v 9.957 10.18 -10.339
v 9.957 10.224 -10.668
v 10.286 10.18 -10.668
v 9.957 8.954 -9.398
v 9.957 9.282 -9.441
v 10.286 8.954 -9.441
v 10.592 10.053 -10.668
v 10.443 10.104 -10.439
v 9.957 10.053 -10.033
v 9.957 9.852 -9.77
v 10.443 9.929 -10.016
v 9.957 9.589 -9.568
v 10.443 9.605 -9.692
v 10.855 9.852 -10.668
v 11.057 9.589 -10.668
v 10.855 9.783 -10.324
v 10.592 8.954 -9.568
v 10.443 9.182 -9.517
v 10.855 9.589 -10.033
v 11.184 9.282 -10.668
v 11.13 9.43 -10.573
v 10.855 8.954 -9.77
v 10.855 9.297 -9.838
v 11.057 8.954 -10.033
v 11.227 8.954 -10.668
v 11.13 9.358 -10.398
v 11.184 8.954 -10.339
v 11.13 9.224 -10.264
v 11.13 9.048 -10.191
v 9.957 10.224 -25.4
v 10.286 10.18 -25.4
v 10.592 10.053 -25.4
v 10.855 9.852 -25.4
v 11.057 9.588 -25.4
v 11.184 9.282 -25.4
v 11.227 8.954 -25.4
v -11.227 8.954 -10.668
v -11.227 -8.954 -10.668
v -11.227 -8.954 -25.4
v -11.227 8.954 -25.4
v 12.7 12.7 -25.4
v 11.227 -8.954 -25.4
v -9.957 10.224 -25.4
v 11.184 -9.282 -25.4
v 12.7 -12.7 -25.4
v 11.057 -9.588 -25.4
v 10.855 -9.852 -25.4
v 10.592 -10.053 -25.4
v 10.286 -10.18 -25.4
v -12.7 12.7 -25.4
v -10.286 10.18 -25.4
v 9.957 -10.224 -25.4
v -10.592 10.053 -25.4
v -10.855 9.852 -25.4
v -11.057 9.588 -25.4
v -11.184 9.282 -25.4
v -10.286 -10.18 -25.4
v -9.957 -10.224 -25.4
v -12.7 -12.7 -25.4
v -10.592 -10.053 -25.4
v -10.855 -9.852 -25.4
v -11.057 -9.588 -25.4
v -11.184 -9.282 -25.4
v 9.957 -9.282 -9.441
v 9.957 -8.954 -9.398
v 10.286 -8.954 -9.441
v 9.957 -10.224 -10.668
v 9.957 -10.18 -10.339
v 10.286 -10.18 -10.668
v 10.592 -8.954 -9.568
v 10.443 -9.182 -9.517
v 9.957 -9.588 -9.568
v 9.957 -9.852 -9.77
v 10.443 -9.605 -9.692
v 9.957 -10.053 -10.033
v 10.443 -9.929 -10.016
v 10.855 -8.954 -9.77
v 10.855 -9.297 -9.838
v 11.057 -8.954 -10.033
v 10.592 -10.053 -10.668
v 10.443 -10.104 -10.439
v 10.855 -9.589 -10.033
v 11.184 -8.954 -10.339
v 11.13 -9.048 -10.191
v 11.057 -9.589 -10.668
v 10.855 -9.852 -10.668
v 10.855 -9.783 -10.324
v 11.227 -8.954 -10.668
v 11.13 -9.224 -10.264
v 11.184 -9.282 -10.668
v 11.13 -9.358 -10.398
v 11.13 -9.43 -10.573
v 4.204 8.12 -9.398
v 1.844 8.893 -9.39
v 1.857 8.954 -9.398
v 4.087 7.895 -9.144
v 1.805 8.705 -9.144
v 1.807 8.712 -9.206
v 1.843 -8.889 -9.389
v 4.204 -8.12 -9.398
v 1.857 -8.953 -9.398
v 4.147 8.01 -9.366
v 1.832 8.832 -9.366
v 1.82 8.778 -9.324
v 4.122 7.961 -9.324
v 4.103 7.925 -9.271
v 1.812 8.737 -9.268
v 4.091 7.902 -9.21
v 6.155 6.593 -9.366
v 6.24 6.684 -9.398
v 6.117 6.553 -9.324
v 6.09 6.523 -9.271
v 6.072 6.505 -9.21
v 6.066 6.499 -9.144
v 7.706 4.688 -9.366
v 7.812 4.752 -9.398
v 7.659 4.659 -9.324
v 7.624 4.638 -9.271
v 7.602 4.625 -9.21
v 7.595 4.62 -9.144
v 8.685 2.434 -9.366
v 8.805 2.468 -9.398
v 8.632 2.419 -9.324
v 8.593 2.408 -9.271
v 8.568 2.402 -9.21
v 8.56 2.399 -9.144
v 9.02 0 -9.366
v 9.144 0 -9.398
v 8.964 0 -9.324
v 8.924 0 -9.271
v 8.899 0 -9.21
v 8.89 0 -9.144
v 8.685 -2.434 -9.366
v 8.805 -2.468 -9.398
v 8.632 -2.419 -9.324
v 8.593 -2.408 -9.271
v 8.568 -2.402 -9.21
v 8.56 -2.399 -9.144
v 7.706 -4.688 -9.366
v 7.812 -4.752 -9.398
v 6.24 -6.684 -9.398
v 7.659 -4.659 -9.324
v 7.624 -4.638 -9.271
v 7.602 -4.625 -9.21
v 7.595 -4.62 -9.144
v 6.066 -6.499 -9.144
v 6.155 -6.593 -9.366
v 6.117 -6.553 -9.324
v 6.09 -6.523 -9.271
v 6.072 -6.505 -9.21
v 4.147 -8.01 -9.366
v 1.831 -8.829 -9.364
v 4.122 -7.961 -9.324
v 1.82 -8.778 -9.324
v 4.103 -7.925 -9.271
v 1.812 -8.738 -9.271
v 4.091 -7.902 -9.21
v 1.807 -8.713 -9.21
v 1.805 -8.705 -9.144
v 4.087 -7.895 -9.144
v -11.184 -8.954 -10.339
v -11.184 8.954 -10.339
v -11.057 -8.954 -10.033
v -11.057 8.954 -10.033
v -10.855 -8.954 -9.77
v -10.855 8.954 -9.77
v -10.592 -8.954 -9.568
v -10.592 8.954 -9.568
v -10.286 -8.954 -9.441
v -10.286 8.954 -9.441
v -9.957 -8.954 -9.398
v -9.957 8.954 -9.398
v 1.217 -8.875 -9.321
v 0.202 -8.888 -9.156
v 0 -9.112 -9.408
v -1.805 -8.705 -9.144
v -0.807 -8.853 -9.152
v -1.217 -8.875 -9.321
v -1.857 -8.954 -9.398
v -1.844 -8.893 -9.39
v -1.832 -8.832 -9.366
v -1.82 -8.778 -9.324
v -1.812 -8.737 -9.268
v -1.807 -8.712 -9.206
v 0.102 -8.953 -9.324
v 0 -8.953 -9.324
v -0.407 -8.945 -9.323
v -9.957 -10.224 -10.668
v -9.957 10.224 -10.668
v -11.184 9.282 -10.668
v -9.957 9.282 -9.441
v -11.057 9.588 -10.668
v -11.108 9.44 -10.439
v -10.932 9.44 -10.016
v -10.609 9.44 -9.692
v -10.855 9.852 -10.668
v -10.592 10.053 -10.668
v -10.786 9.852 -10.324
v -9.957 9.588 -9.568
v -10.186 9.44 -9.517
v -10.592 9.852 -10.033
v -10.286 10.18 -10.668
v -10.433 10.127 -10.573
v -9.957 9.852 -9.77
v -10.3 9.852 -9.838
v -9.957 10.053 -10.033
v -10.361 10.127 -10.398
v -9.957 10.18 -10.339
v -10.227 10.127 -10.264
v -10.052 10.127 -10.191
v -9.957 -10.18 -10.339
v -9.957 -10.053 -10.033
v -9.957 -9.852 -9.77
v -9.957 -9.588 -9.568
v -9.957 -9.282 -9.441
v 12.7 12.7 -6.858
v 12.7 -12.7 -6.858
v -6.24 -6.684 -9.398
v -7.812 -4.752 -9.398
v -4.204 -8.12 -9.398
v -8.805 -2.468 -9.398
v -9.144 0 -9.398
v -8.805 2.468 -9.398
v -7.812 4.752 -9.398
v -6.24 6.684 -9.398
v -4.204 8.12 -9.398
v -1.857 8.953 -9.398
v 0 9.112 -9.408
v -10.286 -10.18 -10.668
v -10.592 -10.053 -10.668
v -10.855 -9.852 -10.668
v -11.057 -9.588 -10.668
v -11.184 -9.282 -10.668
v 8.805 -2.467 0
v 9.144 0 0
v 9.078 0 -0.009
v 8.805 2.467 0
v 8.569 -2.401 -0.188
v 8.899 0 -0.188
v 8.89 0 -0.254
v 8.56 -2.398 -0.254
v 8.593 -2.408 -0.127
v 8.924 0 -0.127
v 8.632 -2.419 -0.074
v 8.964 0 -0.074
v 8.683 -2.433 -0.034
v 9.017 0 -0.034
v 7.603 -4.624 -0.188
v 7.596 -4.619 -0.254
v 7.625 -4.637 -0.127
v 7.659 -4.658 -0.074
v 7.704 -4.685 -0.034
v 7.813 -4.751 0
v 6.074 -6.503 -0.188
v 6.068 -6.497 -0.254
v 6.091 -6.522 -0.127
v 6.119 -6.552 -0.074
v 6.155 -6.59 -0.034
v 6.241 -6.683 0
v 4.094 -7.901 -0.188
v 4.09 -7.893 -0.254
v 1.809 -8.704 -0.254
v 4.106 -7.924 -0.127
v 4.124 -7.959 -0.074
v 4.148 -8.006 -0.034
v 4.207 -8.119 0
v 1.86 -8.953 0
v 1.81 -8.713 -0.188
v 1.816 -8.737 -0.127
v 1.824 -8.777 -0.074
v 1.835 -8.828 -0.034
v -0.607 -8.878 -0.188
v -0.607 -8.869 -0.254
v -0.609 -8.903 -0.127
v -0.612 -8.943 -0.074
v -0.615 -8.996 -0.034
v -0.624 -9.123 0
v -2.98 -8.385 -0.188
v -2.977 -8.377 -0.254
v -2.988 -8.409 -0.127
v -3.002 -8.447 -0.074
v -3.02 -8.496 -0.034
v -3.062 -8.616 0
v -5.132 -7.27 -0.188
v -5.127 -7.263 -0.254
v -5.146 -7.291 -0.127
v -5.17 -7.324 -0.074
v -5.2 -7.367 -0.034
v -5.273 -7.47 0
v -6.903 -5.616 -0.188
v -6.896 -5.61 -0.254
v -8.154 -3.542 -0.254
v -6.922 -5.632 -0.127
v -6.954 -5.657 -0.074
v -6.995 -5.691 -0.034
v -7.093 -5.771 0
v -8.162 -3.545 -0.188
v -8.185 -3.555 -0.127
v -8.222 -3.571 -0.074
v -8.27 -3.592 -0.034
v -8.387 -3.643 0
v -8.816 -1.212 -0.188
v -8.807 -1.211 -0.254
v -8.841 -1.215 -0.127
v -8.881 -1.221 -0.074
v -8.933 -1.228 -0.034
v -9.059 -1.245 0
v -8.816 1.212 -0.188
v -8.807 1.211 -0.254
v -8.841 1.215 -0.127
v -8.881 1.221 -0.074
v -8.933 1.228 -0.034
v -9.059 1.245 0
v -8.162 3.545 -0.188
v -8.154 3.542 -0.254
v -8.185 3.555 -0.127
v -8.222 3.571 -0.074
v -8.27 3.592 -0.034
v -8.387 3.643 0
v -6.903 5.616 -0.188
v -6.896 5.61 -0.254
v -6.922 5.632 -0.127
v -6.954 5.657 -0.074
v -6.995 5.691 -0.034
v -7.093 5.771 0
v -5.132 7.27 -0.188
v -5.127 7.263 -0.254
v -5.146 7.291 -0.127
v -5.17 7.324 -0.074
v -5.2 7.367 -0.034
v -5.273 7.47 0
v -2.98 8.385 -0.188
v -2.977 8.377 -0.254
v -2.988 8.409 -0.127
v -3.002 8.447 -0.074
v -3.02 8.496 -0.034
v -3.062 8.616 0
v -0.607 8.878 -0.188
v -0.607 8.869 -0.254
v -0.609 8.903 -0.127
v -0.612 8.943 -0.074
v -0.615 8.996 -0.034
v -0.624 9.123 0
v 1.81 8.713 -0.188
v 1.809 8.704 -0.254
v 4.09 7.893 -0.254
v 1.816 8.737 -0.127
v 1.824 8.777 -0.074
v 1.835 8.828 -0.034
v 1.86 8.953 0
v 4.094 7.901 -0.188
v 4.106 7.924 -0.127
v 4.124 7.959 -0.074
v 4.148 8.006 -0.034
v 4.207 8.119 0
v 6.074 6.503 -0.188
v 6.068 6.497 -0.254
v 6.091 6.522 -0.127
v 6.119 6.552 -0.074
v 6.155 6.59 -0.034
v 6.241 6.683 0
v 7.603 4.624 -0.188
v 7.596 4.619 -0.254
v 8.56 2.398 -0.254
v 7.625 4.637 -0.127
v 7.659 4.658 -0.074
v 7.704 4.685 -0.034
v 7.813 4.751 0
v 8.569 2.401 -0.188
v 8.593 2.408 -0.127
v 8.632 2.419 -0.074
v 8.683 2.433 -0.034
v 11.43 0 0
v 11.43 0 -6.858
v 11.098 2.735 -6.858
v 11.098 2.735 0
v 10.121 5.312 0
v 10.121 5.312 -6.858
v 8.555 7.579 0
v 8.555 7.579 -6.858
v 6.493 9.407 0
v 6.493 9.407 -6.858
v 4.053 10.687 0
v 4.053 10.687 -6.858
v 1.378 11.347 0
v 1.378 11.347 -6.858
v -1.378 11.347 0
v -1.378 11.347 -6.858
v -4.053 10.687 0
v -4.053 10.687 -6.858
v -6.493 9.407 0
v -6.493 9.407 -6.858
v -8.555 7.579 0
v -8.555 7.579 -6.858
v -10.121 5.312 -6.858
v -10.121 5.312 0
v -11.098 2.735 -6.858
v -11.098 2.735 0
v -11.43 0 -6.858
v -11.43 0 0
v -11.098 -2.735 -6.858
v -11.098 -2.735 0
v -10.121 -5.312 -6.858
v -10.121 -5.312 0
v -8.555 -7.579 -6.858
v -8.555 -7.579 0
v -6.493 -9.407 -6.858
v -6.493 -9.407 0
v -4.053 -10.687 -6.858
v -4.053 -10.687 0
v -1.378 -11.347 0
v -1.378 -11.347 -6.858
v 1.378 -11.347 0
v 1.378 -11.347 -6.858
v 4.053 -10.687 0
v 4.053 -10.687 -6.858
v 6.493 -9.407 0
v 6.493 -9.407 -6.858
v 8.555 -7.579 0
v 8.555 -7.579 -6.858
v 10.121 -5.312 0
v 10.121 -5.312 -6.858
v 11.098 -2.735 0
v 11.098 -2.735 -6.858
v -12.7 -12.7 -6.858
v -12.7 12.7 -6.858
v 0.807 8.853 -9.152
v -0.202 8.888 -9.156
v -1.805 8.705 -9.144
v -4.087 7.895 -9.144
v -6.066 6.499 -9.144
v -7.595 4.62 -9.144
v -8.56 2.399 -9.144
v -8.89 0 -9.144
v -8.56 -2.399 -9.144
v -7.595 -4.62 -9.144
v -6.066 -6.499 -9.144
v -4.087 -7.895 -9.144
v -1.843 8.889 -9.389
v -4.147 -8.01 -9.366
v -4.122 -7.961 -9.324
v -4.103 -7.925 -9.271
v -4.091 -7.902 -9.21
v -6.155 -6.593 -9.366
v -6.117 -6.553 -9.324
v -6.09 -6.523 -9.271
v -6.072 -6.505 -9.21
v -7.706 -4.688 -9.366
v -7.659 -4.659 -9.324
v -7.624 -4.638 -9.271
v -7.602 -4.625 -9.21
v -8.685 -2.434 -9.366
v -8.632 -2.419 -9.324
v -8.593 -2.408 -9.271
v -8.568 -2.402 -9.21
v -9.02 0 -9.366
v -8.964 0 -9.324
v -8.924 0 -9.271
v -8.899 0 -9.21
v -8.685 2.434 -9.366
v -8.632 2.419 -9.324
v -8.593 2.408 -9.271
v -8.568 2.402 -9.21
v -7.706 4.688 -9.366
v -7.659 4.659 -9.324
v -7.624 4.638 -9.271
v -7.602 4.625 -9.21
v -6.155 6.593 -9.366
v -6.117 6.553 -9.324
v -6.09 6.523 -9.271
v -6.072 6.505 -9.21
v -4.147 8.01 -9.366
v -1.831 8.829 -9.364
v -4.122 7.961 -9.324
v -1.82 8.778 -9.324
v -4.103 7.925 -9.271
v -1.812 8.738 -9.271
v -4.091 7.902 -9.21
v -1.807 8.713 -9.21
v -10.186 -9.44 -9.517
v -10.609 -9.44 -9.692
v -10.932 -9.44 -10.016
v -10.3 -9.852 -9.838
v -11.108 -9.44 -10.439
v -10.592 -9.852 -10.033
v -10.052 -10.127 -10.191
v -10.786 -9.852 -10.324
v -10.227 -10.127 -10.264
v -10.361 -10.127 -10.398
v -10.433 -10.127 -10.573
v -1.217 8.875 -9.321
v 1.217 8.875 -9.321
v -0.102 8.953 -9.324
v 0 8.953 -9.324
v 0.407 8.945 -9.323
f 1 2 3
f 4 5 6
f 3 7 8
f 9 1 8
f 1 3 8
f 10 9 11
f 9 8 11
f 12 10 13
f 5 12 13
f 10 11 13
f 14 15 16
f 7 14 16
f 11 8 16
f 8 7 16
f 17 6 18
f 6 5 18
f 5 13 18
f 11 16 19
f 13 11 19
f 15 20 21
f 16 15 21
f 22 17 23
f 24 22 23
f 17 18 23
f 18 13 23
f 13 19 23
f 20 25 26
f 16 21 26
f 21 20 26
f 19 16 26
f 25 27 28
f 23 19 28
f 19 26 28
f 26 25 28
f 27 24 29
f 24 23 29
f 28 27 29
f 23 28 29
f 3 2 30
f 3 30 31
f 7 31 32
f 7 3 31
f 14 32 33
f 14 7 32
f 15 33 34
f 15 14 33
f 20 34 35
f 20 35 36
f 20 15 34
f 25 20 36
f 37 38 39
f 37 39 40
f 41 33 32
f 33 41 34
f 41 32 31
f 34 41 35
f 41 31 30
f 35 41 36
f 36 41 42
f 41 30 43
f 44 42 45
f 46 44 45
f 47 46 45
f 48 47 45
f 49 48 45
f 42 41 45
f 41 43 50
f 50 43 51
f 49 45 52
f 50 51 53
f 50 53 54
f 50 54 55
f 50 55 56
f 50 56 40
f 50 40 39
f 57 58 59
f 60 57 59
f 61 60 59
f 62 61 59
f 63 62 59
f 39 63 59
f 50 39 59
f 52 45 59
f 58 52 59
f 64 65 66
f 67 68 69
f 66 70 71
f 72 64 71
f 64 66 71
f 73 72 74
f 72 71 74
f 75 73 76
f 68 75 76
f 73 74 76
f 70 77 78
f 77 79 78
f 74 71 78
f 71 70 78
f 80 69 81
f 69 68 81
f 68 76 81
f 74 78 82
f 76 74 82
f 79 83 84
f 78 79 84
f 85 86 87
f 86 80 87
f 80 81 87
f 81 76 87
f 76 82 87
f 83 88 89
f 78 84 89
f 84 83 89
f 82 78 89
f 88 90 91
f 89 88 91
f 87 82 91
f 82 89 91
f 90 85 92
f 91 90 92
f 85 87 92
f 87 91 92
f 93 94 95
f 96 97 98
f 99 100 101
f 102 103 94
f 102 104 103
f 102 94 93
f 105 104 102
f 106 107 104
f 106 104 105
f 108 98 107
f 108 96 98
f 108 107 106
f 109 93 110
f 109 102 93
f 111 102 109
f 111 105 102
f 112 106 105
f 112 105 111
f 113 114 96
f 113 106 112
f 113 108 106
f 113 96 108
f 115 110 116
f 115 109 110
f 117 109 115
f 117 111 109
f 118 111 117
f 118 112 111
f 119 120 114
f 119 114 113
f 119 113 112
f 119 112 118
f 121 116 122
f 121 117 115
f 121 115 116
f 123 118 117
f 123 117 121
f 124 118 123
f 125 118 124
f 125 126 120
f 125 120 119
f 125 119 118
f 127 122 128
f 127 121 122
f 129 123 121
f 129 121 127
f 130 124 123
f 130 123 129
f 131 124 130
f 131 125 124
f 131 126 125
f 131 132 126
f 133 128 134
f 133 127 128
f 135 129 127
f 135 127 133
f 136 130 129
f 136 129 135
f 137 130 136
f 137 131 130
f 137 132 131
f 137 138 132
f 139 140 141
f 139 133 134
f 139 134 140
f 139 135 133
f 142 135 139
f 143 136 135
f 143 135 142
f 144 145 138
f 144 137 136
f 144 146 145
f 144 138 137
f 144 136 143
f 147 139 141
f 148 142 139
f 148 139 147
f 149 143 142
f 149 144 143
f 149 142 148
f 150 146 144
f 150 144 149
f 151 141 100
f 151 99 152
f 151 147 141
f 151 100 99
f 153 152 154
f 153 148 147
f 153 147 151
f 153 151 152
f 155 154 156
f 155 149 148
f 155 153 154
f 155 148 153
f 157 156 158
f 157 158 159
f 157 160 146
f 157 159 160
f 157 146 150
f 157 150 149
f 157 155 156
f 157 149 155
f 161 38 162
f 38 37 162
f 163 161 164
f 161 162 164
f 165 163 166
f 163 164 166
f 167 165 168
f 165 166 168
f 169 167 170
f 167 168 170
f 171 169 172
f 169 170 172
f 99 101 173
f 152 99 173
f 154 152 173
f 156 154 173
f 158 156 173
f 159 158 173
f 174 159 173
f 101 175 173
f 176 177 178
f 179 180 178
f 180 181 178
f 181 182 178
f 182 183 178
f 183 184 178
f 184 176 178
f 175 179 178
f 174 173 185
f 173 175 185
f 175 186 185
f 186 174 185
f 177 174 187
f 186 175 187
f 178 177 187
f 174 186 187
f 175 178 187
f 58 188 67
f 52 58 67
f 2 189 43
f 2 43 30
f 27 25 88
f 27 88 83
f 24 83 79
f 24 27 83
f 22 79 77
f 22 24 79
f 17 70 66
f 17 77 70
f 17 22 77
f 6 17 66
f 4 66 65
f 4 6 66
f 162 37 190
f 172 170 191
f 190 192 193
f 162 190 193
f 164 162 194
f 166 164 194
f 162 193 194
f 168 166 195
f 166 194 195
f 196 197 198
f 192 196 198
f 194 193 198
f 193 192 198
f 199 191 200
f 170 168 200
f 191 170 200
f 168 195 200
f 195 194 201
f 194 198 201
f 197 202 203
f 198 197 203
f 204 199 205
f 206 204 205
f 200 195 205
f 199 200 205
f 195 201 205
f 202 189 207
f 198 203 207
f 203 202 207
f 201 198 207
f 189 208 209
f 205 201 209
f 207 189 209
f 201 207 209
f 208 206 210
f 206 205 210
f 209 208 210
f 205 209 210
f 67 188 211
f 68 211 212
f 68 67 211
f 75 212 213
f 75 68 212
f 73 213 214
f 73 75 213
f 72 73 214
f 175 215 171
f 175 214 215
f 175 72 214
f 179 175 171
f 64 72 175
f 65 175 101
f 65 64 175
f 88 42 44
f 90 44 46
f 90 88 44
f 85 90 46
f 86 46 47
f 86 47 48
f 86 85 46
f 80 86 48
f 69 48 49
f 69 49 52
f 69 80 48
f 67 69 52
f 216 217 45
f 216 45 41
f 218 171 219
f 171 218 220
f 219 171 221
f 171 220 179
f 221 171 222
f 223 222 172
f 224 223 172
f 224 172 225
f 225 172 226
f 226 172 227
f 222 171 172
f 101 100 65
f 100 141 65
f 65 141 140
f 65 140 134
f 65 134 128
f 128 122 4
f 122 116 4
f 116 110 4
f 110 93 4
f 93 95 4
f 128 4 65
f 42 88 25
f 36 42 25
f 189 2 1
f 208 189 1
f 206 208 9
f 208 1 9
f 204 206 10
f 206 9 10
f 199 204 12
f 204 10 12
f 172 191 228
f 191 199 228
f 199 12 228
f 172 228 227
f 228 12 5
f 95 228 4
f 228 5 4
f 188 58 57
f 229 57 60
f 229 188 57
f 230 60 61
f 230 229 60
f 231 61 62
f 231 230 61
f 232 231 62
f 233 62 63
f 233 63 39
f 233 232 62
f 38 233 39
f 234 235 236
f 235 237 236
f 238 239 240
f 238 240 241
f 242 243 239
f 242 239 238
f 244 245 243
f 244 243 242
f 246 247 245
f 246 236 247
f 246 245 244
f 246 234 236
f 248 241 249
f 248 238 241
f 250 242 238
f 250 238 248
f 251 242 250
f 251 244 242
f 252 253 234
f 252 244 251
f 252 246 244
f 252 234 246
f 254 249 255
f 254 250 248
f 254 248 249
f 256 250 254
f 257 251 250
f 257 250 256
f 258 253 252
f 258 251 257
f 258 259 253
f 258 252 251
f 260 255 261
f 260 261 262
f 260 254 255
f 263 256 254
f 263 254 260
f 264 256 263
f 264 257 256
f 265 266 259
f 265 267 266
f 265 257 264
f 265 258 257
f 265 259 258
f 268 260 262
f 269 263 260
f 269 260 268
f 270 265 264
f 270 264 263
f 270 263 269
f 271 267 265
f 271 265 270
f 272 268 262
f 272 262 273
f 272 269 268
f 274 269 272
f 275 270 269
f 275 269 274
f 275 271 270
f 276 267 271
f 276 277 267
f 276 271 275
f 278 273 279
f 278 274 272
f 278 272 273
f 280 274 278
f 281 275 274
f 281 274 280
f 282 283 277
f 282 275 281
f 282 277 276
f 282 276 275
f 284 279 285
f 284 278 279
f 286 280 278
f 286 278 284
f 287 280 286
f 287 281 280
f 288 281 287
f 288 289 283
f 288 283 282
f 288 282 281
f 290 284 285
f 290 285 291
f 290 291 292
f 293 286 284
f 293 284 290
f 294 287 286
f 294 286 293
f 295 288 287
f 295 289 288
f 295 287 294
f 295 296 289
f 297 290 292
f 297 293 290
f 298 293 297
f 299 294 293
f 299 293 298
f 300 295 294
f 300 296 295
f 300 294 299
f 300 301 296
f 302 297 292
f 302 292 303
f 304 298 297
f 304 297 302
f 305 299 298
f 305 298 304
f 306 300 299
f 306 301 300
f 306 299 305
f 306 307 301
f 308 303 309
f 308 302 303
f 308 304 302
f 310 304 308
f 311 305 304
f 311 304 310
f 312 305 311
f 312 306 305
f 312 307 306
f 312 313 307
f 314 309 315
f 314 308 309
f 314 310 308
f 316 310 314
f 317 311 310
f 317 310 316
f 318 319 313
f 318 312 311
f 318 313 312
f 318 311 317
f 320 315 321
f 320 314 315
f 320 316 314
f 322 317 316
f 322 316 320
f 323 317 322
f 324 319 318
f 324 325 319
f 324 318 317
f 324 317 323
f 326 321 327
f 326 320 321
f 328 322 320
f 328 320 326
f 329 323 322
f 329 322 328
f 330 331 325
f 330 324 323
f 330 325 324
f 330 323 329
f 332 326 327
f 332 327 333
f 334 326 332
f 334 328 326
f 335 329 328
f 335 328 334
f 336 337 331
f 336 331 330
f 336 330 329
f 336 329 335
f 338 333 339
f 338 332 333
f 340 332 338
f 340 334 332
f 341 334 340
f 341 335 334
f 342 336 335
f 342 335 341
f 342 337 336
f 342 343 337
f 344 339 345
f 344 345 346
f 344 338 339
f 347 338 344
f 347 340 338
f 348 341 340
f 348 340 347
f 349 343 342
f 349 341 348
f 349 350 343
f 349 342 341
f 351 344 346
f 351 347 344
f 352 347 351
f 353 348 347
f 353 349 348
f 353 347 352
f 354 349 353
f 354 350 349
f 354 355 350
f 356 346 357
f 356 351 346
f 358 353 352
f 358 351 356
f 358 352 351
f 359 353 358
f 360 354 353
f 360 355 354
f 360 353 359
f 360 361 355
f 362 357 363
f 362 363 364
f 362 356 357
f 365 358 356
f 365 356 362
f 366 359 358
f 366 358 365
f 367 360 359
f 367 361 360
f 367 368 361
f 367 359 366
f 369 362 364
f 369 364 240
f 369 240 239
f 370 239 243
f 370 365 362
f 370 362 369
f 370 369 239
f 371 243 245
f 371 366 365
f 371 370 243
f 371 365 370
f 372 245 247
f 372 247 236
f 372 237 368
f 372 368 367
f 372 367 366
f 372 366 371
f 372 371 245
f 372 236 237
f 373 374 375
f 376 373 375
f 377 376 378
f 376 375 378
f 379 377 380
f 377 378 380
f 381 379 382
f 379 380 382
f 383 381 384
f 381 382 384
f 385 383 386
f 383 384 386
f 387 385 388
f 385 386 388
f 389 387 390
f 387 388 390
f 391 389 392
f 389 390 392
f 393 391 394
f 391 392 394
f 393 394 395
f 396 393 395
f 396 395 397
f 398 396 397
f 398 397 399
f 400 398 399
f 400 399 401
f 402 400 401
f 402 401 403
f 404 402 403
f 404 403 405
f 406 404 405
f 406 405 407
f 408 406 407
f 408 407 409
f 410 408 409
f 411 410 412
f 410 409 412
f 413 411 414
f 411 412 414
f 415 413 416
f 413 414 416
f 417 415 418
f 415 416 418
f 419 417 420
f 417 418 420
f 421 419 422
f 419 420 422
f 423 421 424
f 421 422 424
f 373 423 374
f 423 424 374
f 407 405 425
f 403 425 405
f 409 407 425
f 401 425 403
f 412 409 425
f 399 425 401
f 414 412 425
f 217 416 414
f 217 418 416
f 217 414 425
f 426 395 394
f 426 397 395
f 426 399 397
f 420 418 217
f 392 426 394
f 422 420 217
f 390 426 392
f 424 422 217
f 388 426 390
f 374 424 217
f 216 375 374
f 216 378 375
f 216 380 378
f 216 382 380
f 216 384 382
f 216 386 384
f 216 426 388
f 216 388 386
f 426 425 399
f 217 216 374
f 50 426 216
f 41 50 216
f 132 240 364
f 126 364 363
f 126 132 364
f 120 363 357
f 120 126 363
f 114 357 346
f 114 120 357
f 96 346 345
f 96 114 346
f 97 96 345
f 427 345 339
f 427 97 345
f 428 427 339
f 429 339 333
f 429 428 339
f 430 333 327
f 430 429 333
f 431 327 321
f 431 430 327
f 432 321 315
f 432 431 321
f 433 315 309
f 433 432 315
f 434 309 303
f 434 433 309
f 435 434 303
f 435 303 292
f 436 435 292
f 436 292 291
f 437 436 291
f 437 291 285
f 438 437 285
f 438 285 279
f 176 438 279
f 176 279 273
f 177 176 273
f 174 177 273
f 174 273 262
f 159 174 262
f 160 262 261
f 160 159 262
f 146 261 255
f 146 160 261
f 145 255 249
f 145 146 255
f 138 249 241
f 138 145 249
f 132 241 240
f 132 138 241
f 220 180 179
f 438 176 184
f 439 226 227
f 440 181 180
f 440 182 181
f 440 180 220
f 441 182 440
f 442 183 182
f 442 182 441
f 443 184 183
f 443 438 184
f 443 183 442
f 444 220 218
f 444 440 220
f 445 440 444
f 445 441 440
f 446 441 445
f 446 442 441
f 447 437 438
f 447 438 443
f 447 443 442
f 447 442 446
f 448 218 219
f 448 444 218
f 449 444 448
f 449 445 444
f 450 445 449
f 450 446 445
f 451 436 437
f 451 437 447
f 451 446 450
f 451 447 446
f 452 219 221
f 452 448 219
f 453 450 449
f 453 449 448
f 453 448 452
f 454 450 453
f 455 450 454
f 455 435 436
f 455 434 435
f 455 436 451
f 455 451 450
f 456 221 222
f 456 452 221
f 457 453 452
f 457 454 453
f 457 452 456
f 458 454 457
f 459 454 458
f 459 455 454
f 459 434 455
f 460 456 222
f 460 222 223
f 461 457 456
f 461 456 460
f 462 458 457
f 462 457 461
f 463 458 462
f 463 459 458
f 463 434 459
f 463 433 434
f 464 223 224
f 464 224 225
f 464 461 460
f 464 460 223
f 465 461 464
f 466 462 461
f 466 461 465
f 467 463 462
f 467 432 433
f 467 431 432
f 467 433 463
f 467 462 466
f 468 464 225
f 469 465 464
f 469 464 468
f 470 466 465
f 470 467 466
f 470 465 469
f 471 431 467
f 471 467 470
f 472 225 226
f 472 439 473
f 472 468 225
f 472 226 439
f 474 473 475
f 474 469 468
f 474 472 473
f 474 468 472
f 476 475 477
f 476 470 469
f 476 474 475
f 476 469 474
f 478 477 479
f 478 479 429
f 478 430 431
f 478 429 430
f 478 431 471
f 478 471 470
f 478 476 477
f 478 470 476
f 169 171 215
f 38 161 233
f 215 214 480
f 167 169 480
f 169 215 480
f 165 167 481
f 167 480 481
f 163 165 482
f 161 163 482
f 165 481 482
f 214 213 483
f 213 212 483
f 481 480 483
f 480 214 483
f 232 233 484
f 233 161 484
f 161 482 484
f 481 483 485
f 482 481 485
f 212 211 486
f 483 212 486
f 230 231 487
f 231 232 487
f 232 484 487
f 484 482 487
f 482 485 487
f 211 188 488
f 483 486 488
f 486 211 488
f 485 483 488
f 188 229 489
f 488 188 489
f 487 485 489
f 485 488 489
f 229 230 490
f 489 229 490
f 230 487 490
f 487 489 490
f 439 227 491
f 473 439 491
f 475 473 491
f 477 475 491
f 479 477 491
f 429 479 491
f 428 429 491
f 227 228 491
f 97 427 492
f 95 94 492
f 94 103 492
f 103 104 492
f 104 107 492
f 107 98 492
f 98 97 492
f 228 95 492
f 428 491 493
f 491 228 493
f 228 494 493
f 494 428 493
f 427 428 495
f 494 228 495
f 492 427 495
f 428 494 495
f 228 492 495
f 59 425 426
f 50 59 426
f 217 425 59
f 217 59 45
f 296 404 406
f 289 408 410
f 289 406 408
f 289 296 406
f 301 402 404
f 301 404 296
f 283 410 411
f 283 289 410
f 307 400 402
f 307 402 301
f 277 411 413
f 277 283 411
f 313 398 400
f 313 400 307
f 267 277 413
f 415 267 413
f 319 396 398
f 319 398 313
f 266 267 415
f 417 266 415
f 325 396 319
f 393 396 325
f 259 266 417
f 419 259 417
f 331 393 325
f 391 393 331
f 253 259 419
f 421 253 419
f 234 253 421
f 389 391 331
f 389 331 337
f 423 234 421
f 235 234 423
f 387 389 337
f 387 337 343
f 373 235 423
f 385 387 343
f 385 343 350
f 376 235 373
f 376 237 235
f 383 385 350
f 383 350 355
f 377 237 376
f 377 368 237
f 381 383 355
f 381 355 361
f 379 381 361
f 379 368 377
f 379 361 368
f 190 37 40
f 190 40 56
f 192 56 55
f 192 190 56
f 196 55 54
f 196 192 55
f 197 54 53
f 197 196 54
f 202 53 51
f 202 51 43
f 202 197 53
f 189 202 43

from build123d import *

# Parameters (mm, degrees)
SKETCH1_W               = 25.4
SKETCH1_H               = 25.4
BOSS_EXTRUDE1_DEPTH     = 25.4
SKETCH2_W               = 22.4536
SKETCH2_H               = 20.447
CUT_EXTRUDE1_DEPTH      = 25.055020349
CUT_EXTRUDE2_DEPTH      = 32.108519733
CUT_EXTRUDE2_DEPTH_BACK = 32.108519733
SKETCH3_R               = 8.89
SKETCH4_R               = 63.5
SKETCH4_R_2             = 11.43
CUT_EXTRUDE3_DEPTH      = 26.814448745
FILLET1_R               = 1.27
FILLET2_R               = 1.27
FILLET3_R               = 0.254


with BuildPart() as part:
    # Sketch1 → Boss-Extrude1 (new body)
    with BuildSketch(Plane.XY):
        Rectangle(SKETCH1_W, SKETCH1_H)
    extrude(amount=-BOSS_EXTRUDE1_DEPTH)

    # Sketch2 → Cut-Extrude1 (cut, through all)
    with BuildSketch(Plane.XY.offset(-9.398)):
        Rectangle(SKETCH2_W, SKETCH2_H)
    extrude(amount=-CUT_EXTRUDE1_DEPTH, mode=Mode.SUBTRACT)

    # Sketch3 → Cut-Extrude2 (cut, two sides: drawn at the far end of the back side and taken through both)
    with BuildSketch(Plane.XY.offset(-CUT_EXTRUDE2_DEPTH_BACK)):
        Circle(SKETCH3_R)
    extrude(amount=CUT_EXTRUDE2_DEPTH + CUT_EXTRUDE2_DEPTH_BACK, mode=Mode.SUBTRACT)

    # Sketch4 → Cut-Extrude3 (cut, through all)
    with BuildSketch(Plane.XY.offset(-6.858)):
        Circle(SKETCH4_R)
        Circle(SKETCH4_R_2, mode=Mode.SUBTRACT)
    extrude(amount=CUT_EXTRUDE3_DEPTH, mode=Mode.SUBTRACT)

    # Fillet1
    fillet1_edges = [part.edges().sort_by_distance(p)[0] for p in [
        (-11.2268, 0, -9.398),
        (0, -10.2235, -9.398),
        (11.2268, 0, -9.398),
        (0, 10.2235, -9.398),
    ]]
    fillet(fillet1_edges, radius=FILLET1_R)

    # Fillet2
    # the kernel refuses this fillet: 1.27 mm, written as the material it adds along each edge
    with BuildSketch(Plane(origin=(-9.9568, 8.9535, -10.668), x_dir=(-1, 0, 0), z_dir=(0, 1, 0))) as fillet2_piece_1_section:
        Polygon((0, 0), (FILLET2_R, 0), (FILLET2_R, FILLET2_R), (0, FILLET2_R), align=None)
    fillet2_piece_1 = extrude(amount=FILLET2_R, mode=Mode.PRIVATE)
    fillet2_piece_1 = fillet2_piece_1 - Plane(origin=(-9.9568, 8.9535, -10.668), x_dir=(0.7071067811865475, 0, -0.7071067811865475), z_dir=(0, 1, 0)) * Sphere(FILLET2_R, mode=Mode.PRIVATE)
    add(fillet2_piece_1)
    with BuildSketch(Plane(origin=(9.9568, 8.9535, -10.668), x_dir=(0, 1, 0), z_dir=(1, 0, 0))) as fillet2_piece_2_section:
        Polygon((0, 0), (FILLET2_R, 0), (FILLET2_R, FILLET2_R), (0, FILLET2_R), align=None)
    fillet2_piece_2 = extrude(amount=FILLET2_R, mode=Mode.PRIVATE)
    fillet2_piece_2 = fillet2_piece_2 - Plane(origin=(9.9568, 8.9535, -10.668), x_dir=(0, -0.7071067811865475, -0.7071067811865475), z_dir=(1, 0, 0)) * Sphere(FILLET2_R, mode=Mode.PRIVATE)
    add(fillet2_piece_2)
    with BuildSketch(Plane(origin=(-9.9568, -8.9535, -10.668), x_dir=(-1, 0, 0), z_dir=(0, -1, 0))) as fillet2_piece_3_section:
        Polygon((0, 0), (FILLET2_R, 0), (FILLET2_R, -FILLET2_R), (0, -FILLET2_R), align=None)
    fillet2_piece_3 = extrude(amount=FILLET2_R, mode=Mode.PRIVATE)
    fillet2_piece_3 = fillet2_piece_3 - Plane(origin=(-9.9568, -8.9535, -10.668), x_dir=(0.7071067811865475, 0, -0.7071067811865475), z_dir=(0, -1, 0)) * Sphere(FILLET2_R, mode=Mode.PRIVATE)
    add(fillet2_piece_3)
    with BuildSketch(Plane(origin=(9.9568, -8.9535, -10.668), x_dir=(0, -1, 0), z_dir=(1, 0, 0))) as fillet2_piece_4_section:
        Polygon((0, 0), (FILLET2_R, 0), (FILLET2_R, -FILLET2_R), (0, -FILLET2_R), align=None)
    fillet2_piece_4 = extrude(amount=FILLET2_R, mode=Mode.PRIVATE)
    fillet2_piece_4 = fillet2_piece_4 - Plane(origin=(9.9568, -8.9535, -10.668), x_dir=(0, 0.7071067811865475, -0.7071067811865475), z_dir=(1, 0, 0)) * Sphere(FILLET2_R, mode=Mode.PRIVATE)
    add(fillet2_piece_4)
    with BuildSketch(Plane(origin=(-11.2268, -10.2235, -10.668), x_dir=(1, 0, 0), z_dir=(0, 0, -1)), Plane(origin=(11.2268, -10.2235, -10.668), x_dir=(0, 1, 0), z_dir=(0, 0, -1))) as fillet2_piece_5:
        with BuildLine():
            CenterArc((FILLET2_R, -FILLET2_R), FILLET2_R, 90, 90)
            Line((0, -FILLET2_R), (0, 0))
            Line((0, 0), (FILLET2_R, 0))
        make_face()
    extrude(amount=14.732)
    with BuildSketch(Plane(origin=(-11.2268, 10.2235, -10.668), x_dir=(1, 0, 0), z_dir=(0, 0, -1)), Plane(origin=(11.2268, 10.2235, -10.668), x_dir=(0, -1, 0), z_dir=(0, 0, -1))) as fillet2_piece_6:
        with BuildLine():
            CenterArc((FILLET2_R, FILLET2_R), FILLET2_R, 180, 90)
            Line((0, FILLET2_R), (0, 0))
            Line((0, 0), (FILLET2_R, 0))
        make_face()
    extrude(amount=14.732)

    # Fillet3
    fillet3_edges = [part.edges().sort_by_distance(p)[0] for p in [
        (-8.89, 0, 0),
        (-8.89, 0, -9.398),
    ]]
    fillet(fillet3_edges, radius=FILLET3_R)


solid = part.part
